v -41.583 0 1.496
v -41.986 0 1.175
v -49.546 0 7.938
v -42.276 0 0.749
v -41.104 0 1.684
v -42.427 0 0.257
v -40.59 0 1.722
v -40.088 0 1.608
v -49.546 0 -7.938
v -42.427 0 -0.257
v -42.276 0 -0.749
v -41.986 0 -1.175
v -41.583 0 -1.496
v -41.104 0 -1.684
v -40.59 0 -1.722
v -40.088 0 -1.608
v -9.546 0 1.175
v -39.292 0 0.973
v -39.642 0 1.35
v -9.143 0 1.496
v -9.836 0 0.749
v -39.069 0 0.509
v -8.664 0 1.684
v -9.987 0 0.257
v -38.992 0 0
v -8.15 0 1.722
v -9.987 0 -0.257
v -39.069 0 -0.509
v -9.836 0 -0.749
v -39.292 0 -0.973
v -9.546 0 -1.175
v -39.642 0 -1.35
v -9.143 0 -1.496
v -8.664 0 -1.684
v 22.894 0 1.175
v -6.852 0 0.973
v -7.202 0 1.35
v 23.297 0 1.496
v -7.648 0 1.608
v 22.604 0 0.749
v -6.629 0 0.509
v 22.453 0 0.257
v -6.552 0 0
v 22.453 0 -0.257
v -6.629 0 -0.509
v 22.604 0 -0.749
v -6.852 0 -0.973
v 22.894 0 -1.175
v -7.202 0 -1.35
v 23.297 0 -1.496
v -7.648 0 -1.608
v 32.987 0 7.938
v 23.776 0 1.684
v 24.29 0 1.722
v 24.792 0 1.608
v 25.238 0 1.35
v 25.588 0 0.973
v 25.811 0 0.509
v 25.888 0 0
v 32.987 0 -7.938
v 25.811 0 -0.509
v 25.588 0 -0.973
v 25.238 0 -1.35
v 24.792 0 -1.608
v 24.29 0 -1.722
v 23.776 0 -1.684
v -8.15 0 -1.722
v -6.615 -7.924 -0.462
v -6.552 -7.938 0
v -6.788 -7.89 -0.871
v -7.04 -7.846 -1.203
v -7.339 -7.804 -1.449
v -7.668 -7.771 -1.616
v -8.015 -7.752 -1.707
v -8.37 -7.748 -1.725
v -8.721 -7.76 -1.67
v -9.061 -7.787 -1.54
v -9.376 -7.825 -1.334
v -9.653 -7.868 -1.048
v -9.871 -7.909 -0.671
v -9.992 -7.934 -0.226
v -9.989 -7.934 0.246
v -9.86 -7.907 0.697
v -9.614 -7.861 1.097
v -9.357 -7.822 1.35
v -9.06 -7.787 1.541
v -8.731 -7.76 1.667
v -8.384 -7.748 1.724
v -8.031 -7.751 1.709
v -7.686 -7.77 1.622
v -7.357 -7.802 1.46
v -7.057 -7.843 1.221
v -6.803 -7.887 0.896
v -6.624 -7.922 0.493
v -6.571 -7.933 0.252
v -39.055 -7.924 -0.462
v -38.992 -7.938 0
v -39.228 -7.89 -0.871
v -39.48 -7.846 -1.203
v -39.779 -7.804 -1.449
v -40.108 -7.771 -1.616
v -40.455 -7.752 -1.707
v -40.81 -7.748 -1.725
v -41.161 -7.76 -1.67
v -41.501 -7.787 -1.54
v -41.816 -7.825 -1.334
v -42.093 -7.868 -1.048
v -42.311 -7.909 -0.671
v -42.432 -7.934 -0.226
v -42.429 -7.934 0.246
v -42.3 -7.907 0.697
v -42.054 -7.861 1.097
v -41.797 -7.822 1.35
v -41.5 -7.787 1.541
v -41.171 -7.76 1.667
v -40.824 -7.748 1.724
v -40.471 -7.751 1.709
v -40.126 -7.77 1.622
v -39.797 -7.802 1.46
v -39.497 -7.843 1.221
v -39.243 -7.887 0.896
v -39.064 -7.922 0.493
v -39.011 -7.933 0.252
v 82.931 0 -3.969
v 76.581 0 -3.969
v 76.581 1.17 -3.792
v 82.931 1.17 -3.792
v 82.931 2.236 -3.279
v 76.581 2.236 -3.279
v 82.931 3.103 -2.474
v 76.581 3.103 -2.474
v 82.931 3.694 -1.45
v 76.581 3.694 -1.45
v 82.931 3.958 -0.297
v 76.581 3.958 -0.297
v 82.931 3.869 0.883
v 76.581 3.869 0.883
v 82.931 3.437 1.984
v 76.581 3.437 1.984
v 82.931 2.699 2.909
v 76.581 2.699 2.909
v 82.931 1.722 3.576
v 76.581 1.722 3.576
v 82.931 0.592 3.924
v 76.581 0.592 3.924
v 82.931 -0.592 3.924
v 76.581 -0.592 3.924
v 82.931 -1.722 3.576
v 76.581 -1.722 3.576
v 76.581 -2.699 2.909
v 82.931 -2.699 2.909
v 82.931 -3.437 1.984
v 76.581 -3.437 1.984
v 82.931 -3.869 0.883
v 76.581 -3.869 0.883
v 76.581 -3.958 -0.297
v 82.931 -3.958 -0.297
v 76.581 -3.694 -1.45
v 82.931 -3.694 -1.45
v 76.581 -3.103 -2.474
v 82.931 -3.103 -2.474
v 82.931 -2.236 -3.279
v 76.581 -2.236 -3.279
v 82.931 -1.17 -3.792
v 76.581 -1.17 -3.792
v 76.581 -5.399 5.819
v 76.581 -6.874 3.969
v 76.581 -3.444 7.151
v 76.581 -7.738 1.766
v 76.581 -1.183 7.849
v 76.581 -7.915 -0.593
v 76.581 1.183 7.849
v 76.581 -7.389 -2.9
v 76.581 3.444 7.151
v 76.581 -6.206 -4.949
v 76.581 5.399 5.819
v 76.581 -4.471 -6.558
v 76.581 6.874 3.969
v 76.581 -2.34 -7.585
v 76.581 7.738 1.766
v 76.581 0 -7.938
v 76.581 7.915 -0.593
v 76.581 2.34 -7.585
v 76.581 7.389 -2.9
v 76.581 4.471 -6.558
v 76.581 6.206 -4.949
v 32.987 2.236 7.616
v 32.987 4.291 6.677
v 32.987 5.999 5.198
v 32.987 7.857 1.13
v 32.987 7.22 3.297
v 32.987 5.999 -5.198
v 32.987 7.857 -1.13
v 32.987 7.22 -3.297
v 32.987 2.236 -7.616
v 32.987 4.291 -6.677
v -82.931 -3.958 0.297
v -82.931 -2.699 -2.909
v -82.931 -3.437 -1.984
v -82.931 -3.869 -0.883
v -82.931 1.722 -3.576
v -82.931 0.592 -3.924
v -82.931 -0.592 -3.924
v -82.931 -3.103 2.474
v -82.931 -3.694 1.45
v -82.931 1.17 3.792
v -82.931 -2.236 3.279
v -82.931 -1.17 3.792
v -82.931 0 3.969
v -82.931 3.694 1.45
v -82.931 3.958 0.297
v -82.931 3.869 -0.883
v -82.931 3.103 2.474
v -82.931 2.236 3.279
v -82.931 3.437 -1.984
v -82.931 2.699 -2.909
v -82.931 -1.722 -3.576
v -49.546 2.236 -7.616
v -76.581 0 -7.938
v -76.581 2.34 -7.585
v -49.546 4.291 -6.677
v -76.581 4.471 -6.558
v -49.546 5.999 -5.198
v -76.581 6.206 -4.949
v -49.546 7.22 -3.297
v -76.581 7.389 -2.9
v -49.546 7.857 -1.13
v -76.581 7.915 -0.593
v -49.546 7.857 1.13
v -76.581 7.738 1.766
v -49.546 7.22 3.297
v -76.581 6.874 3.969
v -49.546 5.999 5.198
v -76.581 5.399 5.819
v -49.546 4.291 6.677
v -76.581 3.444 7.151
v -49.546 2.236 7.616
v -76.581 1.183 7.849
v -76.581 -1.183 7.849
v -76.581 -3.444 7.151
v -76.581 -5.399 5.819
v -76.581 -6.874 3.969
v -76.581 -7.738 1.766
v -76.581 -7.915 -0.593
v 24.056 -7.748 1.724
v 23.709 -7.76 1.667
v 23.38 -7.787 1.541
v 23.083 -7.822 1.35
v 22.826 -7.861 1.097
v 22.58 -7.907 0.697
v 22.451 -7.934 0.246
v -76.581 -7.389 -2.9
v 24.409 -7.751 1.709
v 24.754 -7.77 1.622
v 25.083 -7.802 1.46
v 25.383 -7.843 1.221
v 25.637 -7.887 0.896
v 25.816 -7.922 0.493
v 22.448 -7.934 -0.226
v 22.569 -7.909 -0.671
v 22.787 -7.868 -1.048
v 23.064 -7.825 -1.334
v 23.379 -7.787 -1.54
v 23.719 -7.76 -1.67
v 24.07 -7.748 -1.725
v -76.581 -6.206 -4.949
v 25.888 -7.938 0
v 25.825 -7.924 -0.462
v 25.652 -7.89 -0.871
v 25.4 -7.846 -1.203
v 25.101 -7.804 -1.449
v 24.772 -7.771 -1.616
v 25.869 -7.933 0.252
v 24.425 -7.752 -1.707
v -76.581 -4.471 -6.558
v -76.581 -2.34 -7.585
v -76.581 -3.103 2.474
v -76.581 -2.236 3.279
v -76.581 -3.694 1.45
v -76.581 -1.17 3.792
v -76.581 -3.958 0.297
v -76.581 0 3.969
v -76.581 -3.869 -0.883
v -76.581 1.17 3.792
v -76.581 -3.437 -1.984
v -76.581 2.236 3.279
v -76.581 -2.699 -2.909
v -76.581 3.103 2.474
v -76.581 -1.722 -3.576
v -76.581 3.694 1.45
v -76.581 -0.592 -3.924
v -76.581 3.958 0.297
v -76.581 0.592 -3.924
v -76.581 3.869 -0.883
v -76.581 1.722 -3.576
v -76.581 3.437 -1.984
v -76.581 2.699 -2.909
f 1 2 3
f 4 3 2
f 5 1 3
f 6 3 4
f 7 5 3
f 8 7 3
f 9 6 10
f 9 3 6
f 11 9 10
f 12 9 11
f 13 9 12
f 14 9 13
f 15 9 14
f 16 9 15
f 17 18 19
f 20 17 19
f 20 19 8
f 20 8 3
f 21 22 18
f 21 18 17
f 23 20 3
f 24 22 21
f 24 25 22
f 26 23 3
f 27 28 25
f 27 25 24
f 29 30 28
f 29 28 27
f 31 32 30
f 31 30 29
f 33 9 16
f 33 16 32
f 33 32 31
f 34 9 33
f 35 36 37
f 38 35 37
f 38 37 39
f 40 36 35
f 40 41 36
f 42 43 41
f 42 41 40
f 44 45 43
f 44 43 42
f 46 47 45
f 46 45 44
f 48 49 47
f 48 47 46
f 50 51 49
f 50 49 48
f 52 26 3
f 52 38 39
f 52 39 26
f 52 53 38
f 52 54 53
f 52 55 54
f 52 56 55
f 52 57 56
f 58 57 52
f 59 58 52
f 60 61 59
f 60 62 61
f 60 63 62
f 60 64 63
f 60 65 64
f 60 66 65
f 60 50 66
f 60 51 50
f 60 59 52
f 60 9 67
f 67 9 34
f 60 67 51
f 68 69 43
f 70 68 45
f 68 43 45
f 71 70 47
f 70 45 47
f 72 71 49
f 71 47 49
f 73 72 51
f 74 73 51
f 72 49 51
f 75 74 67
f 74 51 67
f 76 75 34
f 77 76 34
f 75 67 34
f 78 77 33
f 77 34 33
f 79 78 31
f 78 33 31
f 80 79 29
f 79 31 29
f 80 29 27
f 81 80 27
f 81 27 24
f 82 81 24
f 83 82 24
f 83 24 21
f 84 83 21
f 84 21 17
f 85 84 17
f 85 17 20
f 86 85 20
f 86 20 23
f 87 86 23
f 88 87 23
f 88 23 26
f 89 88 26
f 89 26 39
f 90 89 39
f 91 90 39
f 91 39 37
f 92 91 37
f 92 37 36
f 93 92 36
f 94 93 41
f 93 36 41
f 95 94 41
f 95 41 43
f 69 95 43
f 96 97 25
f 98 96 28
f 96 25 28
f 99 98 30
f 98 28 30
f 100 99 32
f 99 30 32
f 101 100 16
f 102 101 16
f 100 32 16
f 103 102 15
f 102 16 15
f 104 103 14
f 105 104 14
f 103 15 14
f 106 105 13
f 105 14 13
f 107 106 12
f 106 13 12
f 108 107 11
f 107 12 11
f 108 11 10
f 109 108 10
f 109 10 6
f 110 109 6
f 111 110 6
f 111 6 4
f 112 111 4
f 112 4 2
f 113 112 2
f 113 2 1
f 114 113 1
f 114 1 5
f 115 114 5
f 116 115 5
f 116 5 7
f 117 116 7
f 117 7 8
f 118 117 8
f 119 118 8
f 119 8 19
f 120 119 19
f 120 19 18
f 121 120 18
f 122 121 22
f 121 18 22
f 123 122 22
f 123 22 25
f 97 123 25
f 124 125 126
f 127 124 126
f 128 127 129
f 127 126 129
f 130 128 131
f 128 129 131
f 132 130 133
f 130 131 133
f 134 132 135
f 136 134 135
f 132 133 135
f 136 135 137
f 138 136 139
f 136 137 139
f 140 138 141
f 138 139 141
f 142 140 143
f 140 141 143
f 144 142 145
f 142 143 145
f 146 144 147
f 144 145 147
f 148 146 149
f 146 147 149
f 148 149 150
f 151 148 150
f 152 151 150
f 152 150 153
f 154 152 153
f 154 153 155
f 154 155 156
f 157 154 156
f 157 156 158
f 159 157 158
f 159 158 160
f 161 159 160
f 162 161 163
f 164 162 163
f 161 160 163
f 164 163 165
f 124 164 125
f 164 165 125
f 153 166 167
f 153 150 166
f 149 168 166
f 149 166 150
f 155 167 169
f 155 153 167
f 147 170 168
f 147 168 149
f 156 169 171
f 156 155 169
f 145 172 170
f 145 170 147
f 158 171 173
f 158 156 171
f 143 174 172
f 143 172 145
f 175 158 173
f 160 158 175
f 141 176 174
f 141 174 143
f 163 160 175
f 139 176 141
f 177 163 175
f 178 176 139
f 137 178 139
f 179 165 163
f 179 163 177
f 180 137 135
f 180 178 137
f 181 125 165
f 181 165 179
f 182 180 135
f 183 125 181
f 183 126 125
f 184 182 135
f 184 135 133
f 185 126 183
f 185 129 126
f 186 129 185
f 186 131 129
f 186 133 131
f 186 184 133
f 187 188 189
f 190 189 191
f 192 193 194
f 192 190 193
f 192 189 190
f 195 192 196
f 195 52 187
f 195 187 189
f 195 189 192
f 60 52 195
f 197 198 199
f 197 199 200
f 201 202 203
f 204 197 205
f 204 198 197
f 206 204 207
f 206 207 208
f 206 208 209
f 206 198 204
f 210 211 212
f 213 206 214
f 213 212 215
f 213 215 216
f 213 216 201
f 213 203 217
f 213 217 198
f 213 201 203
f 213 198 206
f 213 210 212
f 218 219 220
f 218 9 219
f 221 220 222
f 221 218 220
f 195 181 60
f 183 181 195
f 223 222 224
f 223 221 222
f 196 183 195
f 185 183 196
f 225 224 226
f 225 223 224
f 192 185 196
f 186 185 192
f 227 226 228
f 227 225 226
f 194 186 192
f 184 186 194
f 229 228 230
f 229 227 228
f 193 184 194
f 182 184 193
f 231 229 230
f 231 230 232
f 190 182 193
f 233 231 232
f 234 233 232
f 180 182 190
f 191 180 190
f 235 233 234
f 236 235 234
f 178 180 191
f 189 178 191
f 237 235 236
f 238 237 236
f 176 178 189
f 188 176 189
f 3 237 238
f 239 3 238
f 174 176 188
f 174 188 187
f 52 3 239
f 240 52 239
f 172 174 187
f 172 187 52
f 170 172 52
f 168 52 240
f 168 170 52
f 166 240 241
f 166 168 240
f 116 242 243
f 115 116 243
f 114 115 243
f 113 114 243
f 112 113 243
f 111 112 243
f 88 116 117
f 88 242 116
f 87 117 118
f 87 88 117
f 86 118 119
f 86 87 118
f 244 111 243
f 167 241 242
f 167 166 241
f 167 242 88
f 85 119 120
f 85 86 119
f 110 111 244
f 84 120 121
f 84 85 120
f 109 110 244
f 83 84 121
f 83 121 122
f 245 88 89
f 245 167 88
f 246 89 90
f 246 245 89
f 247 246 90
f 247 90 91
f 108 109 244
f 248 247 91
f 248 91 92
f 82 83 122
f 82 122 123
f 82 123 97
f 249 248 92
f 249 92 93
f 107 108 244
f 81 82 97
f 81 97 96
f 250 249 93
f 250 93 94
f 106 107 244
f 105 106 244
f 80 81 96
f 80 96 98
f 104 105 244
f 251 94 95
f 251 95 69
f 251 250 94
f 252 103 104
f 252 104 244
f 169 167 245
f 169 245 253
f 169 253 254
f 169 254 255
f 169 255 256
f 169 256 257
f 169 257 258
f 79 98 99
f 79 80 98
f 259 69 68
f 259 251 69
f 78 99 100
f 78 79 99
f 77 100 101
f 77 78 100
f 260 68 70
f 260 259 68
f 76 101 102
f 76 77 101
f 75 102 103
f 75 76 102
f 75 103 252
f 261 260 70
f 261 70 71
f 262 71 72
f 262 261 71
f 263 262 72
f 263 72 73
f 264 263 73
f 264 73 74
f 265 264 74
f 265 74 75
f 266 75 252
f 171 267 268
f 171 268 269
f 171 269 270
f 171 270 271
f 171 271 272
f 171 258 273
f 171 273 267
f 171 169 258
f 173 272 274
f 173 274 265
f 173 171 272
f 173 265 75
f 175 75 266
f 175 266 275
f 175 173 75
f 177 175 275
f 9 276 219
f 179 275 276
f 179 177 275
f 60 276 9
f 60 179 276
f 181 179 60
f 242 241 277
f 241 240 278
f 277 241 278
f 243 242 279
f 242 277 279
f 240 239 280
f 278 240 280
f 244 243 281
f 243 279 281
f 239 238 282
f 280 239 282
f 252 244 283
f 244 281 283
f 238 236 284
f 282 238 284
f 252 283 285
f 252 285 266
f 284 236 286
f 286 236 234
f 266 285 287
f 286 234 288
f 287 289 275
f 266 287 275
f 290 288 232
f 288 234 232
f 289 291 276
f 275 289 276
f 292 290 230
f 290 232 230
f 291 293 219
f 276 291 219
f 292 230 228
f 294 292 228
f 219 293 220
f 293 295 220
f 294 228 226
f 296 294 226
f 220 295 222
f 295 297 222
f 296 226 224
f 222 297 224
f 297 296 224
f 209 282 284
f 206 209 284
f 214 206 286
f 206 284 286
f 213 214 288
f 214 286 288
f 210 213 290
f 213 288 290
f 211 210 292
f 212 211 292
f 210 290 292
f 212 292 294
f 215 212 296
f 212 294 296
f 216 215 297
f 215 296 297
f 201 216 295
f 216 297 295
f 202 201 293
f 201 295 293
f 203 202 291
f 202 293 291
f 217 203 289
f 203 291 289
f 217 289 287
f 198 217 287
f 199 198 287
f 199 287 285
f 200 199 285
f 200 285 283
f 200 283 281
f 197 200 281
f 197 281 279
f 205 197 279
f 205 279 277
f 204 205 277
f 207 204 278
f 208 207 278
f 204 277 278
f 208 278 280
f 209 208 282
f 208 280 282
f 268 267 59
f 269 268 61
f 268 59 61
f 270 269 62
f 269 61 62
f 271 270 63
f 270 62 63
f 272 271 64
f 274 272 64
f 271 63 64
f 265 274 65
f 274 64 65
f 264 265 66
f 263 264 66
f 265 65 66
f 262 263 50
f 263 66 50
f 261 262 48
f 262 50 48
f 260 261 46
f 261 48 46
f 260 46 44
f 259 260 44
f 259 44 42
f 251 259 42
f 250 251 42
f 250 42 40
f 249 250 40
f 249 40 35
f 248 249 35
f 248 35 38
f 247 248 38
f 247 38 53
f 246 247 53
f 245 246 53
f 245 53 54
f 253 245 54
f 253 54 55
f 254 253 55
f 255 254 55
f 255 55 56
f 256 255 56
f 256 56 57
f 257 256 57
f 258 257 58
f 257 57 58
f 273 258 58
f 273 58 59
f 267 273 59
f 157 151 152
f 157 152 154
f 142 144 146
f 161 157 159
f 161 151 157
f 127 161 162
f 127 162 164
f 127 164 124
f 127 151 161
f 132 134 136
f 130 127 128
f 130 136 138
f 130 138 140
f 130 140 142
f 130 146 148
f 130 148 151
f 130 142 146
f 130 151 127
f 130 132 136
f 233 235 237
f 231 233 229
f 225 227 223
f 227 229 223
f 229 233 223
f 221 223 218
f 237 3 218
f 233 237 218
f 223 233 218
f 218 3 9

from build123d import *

# Parameters (mm, degrees)
SKETCH1_R           = 7.9375
BOSS_EXTRUDE1_DEPTH = 76.581
SKETCH3_R           = 3.96875
BOSS_EXTRUDE2_DEPTH = 6.35
SKETCH4_R           = 3.96875
BOSS_EXTRUDE3_DEPTH = 6.35
SKETCH2_W           = 82.532989992
SKETCH2_H           = 25.4
CUT_EXTRUDE1_DEPTH  = 8.9375
SKETCH5_R           = 1.7272
CUT_EXTRUDE2_DEPTH  = 8.9375


with BuildPart() as part:
    # Sketch1 → Boss-Extrude1 (new body, symmetric)
    with BuildSketch(Plane(origin=(0, 0, 0), x_dir=(0, 0, -1), z_dir=(1, 0, 0))):
        Circle(SKETCH1_R)
    extrude(amount=BOSS_EXTRUDE1_DEPTH, both=True)

    # Sketch3 → Boss-Extrude2 (add)
    with BuildSketch(Plane.ZY.offset(76.581)):
        Circle(SKETCH3_R)
    extrude(amount=BOSS_EXTRUDE2_DEPTH)

    # Sketch4 → Boss-Extrude3 (add)
    with BuildSketch(Plane(origin=(76.581, 0, 0), x_dir=(0, 0, -1), z_dir=(1, 0, 0))):
        Circle(SKETCH4_R)
    extrude(amount=BOSS_EXTRUDE3_DEPTH)

    # Sketch2 → Cut-Extrude1 (cut, through all)
    with BuildSketch(Plane(origin=(0, 0, 0), x_dir=(1, 0, 0), z_dir=(0, 1, 0))):
        with Locations((-8.279380004, 0)):
            Rectangle(SKETCH2_W, SKETCH2_H)
    extrude(amount=CUT_EXTRUDE1_DEPTH, mode=Mode.SUBTRACT)

    # Sketch5 → Cut-Extrude2 (cut, through all)
    with BuildSketch(Plane(origin=(0, 0, 0), x_dir=(1, 0, 0), z_dir=(0, 1, 0))):
        with Locations((-40.719375, 0)):
            Circle(SKETCH5_R)
        with Locations((-8.279380004, 0)):
            Circle(SKETCH5_R)
        with Locations((24.160614992, 0)):
            Circle(SKETCH5_R)
    extrude(amount=-CUT_EXTRUDE2_DEPTH, mode=Mode.SUBTRACT)


solid = part.part
